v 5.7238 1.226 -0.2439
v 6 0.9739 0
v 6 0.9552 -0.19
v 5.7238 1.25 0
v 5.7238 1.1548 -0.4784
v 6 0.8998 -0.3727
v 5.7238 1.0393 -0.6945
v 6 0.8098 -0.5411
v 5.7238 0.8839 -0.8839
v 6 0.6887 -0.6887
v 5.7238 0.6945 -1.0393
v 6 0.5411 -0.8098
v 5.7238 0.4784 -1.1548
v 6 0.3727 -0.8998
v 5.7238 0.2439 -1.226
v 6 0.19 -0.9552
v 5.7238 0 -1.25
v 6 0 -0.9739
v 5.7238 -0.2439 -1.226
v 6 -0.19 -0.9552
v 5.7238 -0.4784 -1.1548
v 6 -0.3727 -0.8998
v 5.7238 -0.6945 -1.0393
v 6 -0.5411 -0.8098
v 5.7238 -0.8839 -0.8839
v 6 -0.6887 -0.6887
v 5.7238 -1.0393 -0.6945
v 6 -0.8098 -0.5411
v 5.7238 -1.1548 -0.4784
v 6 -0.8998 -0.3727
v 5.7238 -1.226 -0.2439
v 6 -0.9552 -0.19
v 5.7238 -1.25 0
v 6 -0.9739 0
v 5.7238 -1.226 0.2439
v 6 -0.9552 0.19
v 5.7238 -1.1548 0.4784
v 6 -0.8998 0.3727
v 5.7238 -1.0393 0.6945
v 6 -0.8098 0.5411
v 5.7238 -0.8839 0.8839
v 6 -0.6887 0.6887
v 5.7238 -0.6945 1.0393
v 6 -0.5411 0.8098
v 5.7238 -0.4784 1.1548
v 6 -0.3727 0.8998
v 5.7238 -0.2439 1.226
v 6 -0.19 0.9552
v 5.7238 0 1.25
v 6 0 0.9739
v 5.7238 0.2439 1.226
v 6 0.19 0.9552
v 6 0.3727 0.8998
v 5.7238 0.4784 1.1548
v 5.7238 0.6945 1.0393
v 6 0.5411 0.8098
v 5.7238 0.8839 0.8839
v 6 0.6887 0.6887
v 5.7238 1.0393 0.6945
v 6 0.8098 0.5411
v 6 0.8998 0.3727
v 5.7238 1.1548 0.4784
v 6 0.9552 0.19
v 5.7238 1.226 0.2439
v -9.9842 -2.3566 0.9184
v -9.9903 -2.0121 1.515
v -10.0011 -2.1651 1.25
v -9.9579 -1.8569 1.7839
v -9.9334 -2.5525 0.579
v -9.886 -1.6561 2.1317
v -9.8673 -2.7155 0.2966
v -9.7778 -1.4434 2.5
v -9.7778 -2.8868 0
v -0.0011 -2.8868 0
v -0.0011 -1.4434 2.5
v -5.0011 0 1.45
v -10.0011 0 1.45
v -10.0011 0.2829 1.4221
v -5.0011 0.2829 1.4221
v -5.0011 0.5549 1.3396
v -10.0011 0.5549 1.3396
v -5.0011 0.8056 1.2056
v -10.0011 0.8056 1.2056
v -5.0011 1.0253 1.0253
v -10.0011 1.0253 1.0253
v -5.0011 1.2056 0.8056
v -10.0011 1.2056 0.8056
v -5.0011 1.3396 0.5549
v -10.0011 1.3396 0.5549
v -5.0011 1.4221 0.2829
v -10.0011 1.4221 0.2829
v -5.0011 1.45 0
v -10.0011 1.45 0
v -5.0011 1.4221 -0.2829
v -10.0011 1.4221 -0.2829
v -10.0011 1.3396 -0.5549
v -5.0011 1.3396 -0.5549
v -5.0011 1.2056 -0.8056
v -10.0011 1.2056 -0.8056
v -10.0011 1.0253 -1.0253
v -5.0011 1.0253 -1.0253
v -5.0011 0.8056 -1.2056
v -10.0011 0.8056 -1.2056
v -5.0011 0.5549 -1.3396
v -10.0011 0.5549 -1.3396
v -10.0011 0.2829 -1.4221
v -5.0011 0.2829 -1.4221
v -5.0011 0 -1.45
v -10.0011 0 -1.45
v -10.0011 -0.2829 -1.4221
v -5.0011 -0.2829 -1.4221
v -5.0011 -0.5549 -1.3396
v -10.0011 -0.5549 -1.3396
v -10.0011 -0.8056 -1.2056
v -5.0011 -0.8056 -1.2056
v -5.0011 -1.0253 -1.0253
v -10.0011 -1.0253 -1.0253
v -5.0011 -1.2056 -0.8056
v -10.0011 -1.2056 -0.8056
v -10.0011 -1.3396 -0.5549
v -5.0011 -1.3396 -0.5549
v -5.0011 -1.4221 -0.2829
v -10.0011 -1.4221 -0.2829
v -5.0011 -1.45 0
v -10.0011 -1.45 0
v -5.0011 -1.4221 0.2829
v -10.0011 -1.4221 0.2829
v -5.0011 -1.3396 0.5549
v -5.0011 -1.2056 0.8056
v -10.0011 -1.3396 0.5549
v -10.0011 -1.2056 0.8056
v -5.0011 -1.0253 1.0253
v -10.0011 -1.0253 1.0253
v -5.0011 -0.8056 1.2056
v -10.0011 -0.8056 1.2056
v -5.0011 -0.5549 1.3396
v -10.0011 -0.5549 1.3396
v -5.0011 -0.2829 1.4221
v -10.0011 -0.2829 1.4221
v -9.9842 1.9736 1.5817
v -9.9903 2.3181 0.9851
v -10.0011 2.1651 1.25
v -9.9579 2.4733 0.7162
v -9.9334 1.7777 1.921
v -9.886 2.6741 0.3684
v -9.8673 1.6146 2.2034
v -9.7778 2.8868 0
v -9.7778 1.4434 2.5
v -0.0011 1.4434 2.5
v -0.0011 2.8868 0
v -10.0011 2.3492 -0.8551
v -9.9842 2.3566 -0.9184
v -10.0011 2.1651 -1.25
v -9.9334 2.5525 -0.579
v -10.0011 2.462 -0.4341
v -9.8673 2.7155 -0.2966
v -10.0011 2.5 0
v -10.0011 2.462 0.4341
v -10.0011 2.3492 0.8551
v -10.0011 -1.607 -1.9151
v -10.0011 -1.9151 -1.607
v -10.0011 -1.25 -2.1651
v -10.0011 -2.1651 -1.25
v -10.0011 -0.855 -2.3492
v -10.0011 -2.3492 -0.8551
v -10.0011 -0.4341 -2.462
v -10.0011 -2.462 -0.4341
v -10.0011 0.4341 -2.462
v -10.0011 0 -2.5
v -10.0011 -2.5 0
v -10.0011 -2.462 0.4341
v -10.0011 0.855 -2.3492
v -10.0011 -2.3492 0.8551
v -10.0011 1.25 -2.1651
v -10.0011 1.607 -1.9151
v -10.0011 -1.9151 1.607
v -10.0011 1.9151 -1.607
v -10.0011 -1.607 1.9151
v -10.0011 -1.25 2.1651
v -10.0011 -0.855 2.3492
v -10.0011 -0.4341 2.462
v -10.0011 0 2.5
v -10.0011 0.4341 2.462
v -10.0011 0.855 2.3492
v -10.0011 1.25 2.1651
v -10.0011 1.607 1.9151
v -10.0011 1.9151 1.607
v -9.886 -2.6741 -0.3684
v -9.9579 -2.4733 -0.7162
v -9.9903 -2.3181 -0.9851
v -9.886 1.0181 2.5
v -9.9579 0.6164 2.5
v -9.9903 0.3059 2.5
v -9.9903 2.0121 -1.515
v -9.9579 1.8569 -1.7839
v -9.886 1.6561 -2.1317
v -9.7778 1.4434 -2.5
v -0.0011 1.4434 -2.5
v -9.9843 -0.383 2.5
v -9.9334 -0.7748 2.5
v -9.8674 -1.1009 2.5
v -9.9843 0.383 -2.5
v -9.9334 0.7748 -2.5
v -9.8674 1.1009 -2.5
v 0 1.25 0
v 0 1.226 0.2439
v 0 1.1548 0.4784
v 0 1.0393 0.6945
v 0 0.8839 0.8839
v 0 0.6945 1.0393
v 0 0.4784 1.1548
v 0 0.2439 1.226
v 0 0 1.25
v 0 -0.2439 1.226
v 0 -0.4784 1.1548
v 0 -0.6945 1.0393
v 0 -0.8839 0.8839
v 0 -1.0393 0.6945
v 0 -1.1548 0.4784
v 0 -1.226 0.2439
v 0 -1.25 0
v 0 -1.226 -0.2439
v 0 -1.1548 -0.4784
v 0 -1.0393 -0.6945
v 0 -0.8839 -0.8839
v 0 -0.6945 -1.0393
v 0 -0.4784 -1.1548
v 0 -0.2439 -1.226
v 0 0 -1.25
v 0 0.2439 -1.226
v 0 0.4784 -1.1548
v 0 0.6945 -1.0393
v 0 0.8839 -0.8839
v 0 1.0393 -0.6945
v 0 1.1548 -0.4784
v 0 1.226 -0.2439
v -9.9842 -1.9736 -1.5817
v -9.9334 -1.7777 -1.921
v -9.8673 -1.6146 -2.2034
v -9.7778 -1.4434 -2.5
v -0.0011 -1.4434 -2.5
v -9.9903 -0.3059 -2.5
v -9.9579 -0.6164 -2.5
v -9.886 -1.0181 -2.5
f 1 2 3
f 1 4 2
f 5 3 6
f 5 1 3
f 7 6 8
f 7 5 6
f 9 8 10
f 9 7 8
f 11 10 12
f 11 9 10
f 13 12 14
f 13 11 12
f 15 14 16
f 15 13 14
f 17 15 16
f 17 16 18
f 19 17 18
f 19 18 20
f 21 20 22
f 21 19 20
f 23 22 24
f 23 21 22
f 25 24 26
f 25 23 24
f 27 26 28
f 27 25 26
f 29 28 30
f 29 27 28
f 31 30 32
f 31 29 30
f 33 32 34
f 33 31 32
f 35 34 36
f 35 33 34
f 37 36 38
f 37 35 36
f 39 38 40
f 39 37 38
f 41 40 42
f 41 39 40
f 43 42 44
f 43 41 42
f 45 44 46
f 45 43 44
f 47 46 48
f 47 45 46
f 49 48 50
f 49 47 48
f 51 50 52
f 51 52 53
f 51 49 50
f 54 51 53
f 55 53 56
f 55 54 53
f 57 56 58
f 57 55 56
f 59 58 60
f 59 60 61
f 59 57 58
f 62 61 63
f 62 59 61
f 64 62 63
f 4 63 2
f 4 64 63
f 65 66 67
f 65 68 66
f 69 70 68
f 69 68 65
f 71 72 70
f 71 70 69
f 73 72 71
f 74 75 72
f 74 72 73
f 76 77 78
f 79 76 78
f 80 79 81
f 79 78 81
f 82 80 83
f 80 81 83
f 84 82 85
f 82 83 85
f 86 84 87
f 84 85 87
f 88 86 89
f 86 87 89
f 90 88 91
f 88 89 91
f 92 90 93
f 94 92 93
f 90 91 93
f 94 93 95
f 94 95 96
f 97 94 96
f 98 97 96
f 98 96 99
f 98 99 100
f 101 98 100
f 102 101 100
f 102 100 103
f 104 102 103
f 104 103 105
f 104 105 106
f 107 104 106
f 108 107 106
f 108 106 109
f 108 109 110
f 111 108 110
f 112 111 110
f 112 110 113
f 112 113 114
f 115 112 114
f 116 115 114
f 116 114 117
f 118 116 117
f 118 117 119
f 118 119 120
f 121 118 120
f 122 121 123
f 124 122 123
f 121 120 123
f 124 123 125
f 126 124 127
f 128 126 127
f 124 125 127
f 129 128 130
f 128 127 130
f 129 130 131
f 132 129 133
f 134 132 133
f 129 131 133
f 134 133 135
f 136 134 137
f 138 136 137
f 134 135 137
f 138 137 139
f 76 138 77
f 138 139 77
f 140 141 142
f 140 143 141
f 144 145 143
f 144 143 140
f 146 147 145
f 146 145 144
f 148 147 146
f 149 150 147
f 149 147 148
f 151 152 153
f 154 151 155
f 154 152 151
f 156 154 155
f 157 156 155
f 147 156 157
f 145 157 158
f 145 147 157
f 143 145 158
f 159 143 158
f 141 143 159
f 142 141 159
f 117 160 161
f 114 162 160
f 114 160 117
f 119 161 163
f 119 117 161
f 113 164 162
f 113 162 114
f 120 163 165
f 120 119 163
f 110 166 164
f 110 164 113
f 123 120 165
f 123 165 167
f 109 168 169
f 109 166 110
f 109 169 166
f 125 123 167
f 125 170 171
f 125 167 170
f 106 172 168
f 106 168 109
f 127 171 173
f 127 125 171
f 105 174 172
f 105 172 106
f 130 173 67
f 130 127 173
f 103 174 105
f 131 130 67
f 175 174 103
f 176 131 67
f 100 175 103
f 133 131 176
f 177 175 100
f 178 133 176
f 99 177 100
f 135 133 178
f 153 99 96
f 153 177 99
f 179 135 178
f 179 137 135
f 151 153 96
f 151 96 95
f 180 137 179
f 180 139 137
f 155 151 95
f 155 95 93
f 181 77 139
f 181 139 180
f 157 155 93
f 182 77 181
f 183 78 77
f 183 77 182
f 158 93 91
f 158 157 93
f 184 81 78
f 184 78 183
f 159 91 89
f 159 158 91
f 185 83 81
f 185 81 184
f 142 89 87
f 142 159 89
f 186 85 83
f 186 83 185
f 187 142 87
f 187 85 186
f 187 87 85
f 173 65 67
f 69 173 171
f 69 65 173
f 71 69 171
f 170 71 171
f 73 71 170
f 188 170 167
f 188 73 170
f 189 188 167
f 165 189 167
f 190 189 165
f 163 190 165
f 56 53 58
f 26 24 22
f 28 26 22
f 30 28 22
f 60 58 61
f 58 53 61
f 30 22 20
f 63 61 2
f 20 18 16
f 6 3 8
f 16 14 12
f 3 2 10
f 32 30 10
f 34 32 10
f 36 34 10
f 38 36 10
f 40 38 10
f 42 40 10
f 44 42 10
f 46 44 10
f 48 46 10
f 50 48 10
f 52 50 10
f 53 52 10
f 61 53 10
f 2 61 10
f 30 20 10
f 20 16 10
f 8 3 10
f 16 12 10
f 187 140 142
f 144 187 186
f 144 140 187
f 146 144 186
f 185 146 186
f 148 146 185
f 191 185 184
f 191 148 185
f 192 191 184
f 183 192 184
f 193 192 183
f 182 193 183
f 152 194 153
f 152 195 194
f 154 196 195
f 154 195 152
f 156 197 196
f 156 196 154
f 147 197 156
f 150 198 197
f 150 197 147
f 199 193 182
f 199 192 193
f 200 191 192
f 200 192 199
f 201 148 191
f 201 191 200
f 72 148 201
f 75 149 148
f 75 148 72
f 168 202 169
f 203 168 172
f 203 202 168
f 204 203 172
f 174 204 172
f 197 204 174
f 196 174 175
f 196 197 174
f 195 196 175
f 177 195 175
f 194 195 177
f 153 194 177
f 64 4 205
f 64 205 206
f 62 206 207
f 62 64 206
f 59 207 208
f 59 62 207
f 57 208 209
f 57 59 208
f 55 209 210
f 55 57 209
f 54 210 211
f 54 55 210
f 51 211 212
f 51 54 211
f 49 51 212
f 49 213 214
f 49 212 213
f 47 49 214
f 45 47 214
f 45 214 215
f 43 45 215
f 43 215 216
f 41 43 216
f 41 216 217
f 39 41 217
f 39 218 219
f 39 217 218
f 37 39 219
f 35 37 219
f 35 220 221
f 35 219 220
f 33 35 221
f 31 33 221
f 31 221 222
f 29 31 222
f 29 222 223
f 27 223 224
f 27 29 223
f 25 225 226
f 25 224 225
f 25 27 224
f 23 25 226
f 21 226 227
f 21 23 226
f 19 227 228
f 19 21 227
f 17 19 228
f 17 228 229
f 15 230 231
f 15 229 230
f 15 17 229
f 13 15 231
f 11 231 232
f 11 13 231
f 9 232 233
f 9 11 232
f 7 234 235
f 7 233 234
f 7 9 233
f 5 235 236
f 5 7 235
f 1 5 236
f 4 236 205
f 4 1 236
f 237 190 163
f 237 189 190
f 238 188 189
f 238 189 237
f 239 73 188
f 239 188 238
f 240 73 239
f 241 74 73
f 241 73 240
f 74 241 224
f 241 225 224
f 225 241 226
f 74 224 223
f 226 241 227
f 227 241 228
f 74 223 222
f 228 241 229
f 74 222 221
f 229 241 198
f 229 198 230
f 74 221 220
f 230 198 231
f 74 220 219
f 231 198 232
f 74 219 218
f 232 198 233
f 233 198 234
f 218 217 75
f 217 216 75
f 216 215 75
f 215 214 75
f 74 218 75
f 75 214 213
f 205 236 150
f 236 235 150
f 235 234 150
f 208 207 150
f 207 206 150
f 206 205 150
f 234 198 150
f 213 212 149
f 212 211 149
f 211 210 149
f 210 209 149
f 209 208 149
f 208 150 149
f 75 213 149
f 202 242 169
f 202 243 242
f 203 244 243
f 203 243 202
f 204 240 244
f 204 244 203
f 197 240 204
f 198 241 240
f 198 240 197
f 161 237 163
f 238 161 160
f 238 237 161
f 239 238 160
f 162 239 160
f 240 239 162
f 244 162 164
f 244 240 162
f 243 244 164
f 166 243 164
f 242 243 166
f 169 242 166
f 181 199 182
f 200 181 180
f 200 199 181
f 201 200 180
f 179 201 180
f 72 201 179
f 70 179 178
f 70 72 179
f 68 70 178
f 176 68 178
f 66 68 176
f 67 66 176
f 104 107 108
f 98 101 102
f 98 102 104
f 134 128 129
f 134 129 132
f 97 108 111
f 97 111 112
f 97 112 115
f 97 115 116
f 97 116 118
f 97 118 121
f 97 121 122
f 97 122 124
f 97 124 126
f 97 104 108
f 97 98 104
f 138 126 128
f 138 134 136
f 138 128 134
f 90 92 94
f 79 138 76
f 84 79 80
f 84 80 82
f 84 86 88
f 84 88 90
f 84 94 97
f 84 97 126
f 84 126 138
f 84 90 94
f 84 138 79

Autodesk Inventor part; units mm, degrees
ref_plane "YZ Plane" through (0, 0, 0) normal (1, 0, 0) x (0, 1, 0)
ref_plane "XZ Plane" through (0, 0, 0) normal (0, 1, 0) x (-1, 0, 0)
sketch "Sketch1" plane through (0, 0, 0) normal (0, 0, 1) x (1, 0, 0)
  line L0 (0, 2.5) -> (0, 1.25)
  line L1 (1.3, 1.25) -> (6, 1.25)
  line L2 (6, 1.25) -> (6, 0)
  line L3 (6, 0) -> (-0.0011, 0)
  line L4 (-1.2013, 0) -> (7.2002, 0) projected
  line L5 (-0.0011, 0) -> (-0.0011, 2.5)
  line L6 (-0.0011, 2.5) -> (0, 2.5)
  line L7 (1.3, 1.25) -> (1.0238, 1.25)
  line L8 (1.0238, 1.25) -> (0, 1.25)
  line L9 (0, -0.5) -> (0, 3) projected
  dimension "d0" = 6
  dimension "d1" = 4.7
  dimension "d2" = 2.5
  dimension "d9" = 0.0011
  dimension "d10" = 5
  dimension "d13" = 0.2762
  dimension "d14" = 2.5
revolve "Body" add sketch "Sketch1" angle 360 about axis through (6, 0, 0) along (-1, 0, 0)
sketch "Sketch2" plane through (-0.0011, 0, 0) normal (-1, 0, 0) x (0, 0, 1)
  line L0 (0, 2.8868) -> (2.5, 1.4434)
  line L1 (2.5, 1.4434) -> (2.5, -1.4434)
  line L2 (2.5, -1.4434) -> (0, -2.8868)
  line L3 (0, -2.8868) -> (-2.5, -1.4434)
  line L4 (-2.5, -1.4434) -> (-2.5, 1.4434)
  line L5 (-2.5, 1.4434) -> (0, 2.8868)
  point P0 (0, 0)
  point P1 (0, 0)
  dimension "d11" = 5
extrude "Head" add sketch "Sketch2" along normal blind 10
sketch "Sketch4" plane through (0, 0, 0) normal (0, 0, 1) x (1, 0, 0)
  line L0 (-10.0011, 2.5) -> (-10.0011, 2.8868)
  line L1 (-10.0011, 2.8868) -> (-9.7778, 2.8868)
  line L2 (-9.7778, 2.8868) -> (-10.0011, 2.5)
  line L3 (-2.0399, 0) -> (0.3387, 0) projected
  line L4 (-0.0011, 2.8868) -> (-10.0011, 2.8868) projected
  line L5 (-10.0011, 1.4434) -> (-10.0011, 2.8868) projected
  dimension "d5" = 30
  dimension "d19" = 5
revolve "Chamfer1" cut sketch "Sketch4" angle 360 about axis through (-10, 0, 0) along (1, 0, 0)
thread "Thread" size "M2.5x0.45" class "6g" standard "ISO Metric profile" length 4.7
chamfer "Chamfer2" distance 0.2761 distance2 0.2762 1 edges at (6, -1.25, 0) measured on face at (6, -0.3871, 0.3429)
ref_plane "Work Plane1" through (1.525, 0, 0) normal (0, 0, 1) x (1, 0, 0)
sketch "Sketch7" plane through (-10.0011, 0, 0) normal (-1, 0, 0) x (0, 0, 1)
  circle A0 centre (0, 0) radius 1.45
  point P0 (0, 0)
  dimension "d59" = 2.9
extrude "Extrusion5" cut sketch "Sketch7" against normal blind 5
equation "\"d11\" = SW"
equation "\"d15\" = GEL"
equation "\"d6\" = -0.5 * SPD + 0.5 * GD"
equation "\"d0\" = NLG"
equation "\"d1\" = GEL"
equation "\"d2\" = GD"
equation "\"d10\" = SD2"
equation "\"d14\" = BDM"
equation "\"d5\" = ANG1"
equation "\"d19\" = SW0"
equation "\"NLG\" = 6"
equation "\"GD\" = NND"
equation "\"BDM\" = NND"
equation "\"KOH\" = 1.7"
equation "\"GEL\" = 4.7"
equation "\"SW\" = 5"
equation "\"SW0\" = SW"
equation "\"SPD\" = NND - 1.2269 * PTC"
equation "\"SD2\" = SW"
equation "\"SD\" = 0.001"
equation "\"ANG1\" = 30deg"
equation "\"GAL\" = 0.61345 * PTC"
equation "\"GUL\" = 0.61345 * PTC"
equation "\"RR\" = 0.001"
equation "\"WFT\" = SD"
equation "\"GD1\" = THREADDIA - 1.2269 * PTC"
equation "\"THREADDIA\" = 2.5"
equation "\"SDH\" = SW"
equation "\"TOA\" = 30deg"
equation "\"FAWI\" = 45deg"
equation "\"PTC\" = 0.45"
equation "\"NND\" = 2.5"
equation "\"E0\" = 1.155 * SW"
properties part number "AS 1110 - M2.5 x 6" material "Steel, Mild"
